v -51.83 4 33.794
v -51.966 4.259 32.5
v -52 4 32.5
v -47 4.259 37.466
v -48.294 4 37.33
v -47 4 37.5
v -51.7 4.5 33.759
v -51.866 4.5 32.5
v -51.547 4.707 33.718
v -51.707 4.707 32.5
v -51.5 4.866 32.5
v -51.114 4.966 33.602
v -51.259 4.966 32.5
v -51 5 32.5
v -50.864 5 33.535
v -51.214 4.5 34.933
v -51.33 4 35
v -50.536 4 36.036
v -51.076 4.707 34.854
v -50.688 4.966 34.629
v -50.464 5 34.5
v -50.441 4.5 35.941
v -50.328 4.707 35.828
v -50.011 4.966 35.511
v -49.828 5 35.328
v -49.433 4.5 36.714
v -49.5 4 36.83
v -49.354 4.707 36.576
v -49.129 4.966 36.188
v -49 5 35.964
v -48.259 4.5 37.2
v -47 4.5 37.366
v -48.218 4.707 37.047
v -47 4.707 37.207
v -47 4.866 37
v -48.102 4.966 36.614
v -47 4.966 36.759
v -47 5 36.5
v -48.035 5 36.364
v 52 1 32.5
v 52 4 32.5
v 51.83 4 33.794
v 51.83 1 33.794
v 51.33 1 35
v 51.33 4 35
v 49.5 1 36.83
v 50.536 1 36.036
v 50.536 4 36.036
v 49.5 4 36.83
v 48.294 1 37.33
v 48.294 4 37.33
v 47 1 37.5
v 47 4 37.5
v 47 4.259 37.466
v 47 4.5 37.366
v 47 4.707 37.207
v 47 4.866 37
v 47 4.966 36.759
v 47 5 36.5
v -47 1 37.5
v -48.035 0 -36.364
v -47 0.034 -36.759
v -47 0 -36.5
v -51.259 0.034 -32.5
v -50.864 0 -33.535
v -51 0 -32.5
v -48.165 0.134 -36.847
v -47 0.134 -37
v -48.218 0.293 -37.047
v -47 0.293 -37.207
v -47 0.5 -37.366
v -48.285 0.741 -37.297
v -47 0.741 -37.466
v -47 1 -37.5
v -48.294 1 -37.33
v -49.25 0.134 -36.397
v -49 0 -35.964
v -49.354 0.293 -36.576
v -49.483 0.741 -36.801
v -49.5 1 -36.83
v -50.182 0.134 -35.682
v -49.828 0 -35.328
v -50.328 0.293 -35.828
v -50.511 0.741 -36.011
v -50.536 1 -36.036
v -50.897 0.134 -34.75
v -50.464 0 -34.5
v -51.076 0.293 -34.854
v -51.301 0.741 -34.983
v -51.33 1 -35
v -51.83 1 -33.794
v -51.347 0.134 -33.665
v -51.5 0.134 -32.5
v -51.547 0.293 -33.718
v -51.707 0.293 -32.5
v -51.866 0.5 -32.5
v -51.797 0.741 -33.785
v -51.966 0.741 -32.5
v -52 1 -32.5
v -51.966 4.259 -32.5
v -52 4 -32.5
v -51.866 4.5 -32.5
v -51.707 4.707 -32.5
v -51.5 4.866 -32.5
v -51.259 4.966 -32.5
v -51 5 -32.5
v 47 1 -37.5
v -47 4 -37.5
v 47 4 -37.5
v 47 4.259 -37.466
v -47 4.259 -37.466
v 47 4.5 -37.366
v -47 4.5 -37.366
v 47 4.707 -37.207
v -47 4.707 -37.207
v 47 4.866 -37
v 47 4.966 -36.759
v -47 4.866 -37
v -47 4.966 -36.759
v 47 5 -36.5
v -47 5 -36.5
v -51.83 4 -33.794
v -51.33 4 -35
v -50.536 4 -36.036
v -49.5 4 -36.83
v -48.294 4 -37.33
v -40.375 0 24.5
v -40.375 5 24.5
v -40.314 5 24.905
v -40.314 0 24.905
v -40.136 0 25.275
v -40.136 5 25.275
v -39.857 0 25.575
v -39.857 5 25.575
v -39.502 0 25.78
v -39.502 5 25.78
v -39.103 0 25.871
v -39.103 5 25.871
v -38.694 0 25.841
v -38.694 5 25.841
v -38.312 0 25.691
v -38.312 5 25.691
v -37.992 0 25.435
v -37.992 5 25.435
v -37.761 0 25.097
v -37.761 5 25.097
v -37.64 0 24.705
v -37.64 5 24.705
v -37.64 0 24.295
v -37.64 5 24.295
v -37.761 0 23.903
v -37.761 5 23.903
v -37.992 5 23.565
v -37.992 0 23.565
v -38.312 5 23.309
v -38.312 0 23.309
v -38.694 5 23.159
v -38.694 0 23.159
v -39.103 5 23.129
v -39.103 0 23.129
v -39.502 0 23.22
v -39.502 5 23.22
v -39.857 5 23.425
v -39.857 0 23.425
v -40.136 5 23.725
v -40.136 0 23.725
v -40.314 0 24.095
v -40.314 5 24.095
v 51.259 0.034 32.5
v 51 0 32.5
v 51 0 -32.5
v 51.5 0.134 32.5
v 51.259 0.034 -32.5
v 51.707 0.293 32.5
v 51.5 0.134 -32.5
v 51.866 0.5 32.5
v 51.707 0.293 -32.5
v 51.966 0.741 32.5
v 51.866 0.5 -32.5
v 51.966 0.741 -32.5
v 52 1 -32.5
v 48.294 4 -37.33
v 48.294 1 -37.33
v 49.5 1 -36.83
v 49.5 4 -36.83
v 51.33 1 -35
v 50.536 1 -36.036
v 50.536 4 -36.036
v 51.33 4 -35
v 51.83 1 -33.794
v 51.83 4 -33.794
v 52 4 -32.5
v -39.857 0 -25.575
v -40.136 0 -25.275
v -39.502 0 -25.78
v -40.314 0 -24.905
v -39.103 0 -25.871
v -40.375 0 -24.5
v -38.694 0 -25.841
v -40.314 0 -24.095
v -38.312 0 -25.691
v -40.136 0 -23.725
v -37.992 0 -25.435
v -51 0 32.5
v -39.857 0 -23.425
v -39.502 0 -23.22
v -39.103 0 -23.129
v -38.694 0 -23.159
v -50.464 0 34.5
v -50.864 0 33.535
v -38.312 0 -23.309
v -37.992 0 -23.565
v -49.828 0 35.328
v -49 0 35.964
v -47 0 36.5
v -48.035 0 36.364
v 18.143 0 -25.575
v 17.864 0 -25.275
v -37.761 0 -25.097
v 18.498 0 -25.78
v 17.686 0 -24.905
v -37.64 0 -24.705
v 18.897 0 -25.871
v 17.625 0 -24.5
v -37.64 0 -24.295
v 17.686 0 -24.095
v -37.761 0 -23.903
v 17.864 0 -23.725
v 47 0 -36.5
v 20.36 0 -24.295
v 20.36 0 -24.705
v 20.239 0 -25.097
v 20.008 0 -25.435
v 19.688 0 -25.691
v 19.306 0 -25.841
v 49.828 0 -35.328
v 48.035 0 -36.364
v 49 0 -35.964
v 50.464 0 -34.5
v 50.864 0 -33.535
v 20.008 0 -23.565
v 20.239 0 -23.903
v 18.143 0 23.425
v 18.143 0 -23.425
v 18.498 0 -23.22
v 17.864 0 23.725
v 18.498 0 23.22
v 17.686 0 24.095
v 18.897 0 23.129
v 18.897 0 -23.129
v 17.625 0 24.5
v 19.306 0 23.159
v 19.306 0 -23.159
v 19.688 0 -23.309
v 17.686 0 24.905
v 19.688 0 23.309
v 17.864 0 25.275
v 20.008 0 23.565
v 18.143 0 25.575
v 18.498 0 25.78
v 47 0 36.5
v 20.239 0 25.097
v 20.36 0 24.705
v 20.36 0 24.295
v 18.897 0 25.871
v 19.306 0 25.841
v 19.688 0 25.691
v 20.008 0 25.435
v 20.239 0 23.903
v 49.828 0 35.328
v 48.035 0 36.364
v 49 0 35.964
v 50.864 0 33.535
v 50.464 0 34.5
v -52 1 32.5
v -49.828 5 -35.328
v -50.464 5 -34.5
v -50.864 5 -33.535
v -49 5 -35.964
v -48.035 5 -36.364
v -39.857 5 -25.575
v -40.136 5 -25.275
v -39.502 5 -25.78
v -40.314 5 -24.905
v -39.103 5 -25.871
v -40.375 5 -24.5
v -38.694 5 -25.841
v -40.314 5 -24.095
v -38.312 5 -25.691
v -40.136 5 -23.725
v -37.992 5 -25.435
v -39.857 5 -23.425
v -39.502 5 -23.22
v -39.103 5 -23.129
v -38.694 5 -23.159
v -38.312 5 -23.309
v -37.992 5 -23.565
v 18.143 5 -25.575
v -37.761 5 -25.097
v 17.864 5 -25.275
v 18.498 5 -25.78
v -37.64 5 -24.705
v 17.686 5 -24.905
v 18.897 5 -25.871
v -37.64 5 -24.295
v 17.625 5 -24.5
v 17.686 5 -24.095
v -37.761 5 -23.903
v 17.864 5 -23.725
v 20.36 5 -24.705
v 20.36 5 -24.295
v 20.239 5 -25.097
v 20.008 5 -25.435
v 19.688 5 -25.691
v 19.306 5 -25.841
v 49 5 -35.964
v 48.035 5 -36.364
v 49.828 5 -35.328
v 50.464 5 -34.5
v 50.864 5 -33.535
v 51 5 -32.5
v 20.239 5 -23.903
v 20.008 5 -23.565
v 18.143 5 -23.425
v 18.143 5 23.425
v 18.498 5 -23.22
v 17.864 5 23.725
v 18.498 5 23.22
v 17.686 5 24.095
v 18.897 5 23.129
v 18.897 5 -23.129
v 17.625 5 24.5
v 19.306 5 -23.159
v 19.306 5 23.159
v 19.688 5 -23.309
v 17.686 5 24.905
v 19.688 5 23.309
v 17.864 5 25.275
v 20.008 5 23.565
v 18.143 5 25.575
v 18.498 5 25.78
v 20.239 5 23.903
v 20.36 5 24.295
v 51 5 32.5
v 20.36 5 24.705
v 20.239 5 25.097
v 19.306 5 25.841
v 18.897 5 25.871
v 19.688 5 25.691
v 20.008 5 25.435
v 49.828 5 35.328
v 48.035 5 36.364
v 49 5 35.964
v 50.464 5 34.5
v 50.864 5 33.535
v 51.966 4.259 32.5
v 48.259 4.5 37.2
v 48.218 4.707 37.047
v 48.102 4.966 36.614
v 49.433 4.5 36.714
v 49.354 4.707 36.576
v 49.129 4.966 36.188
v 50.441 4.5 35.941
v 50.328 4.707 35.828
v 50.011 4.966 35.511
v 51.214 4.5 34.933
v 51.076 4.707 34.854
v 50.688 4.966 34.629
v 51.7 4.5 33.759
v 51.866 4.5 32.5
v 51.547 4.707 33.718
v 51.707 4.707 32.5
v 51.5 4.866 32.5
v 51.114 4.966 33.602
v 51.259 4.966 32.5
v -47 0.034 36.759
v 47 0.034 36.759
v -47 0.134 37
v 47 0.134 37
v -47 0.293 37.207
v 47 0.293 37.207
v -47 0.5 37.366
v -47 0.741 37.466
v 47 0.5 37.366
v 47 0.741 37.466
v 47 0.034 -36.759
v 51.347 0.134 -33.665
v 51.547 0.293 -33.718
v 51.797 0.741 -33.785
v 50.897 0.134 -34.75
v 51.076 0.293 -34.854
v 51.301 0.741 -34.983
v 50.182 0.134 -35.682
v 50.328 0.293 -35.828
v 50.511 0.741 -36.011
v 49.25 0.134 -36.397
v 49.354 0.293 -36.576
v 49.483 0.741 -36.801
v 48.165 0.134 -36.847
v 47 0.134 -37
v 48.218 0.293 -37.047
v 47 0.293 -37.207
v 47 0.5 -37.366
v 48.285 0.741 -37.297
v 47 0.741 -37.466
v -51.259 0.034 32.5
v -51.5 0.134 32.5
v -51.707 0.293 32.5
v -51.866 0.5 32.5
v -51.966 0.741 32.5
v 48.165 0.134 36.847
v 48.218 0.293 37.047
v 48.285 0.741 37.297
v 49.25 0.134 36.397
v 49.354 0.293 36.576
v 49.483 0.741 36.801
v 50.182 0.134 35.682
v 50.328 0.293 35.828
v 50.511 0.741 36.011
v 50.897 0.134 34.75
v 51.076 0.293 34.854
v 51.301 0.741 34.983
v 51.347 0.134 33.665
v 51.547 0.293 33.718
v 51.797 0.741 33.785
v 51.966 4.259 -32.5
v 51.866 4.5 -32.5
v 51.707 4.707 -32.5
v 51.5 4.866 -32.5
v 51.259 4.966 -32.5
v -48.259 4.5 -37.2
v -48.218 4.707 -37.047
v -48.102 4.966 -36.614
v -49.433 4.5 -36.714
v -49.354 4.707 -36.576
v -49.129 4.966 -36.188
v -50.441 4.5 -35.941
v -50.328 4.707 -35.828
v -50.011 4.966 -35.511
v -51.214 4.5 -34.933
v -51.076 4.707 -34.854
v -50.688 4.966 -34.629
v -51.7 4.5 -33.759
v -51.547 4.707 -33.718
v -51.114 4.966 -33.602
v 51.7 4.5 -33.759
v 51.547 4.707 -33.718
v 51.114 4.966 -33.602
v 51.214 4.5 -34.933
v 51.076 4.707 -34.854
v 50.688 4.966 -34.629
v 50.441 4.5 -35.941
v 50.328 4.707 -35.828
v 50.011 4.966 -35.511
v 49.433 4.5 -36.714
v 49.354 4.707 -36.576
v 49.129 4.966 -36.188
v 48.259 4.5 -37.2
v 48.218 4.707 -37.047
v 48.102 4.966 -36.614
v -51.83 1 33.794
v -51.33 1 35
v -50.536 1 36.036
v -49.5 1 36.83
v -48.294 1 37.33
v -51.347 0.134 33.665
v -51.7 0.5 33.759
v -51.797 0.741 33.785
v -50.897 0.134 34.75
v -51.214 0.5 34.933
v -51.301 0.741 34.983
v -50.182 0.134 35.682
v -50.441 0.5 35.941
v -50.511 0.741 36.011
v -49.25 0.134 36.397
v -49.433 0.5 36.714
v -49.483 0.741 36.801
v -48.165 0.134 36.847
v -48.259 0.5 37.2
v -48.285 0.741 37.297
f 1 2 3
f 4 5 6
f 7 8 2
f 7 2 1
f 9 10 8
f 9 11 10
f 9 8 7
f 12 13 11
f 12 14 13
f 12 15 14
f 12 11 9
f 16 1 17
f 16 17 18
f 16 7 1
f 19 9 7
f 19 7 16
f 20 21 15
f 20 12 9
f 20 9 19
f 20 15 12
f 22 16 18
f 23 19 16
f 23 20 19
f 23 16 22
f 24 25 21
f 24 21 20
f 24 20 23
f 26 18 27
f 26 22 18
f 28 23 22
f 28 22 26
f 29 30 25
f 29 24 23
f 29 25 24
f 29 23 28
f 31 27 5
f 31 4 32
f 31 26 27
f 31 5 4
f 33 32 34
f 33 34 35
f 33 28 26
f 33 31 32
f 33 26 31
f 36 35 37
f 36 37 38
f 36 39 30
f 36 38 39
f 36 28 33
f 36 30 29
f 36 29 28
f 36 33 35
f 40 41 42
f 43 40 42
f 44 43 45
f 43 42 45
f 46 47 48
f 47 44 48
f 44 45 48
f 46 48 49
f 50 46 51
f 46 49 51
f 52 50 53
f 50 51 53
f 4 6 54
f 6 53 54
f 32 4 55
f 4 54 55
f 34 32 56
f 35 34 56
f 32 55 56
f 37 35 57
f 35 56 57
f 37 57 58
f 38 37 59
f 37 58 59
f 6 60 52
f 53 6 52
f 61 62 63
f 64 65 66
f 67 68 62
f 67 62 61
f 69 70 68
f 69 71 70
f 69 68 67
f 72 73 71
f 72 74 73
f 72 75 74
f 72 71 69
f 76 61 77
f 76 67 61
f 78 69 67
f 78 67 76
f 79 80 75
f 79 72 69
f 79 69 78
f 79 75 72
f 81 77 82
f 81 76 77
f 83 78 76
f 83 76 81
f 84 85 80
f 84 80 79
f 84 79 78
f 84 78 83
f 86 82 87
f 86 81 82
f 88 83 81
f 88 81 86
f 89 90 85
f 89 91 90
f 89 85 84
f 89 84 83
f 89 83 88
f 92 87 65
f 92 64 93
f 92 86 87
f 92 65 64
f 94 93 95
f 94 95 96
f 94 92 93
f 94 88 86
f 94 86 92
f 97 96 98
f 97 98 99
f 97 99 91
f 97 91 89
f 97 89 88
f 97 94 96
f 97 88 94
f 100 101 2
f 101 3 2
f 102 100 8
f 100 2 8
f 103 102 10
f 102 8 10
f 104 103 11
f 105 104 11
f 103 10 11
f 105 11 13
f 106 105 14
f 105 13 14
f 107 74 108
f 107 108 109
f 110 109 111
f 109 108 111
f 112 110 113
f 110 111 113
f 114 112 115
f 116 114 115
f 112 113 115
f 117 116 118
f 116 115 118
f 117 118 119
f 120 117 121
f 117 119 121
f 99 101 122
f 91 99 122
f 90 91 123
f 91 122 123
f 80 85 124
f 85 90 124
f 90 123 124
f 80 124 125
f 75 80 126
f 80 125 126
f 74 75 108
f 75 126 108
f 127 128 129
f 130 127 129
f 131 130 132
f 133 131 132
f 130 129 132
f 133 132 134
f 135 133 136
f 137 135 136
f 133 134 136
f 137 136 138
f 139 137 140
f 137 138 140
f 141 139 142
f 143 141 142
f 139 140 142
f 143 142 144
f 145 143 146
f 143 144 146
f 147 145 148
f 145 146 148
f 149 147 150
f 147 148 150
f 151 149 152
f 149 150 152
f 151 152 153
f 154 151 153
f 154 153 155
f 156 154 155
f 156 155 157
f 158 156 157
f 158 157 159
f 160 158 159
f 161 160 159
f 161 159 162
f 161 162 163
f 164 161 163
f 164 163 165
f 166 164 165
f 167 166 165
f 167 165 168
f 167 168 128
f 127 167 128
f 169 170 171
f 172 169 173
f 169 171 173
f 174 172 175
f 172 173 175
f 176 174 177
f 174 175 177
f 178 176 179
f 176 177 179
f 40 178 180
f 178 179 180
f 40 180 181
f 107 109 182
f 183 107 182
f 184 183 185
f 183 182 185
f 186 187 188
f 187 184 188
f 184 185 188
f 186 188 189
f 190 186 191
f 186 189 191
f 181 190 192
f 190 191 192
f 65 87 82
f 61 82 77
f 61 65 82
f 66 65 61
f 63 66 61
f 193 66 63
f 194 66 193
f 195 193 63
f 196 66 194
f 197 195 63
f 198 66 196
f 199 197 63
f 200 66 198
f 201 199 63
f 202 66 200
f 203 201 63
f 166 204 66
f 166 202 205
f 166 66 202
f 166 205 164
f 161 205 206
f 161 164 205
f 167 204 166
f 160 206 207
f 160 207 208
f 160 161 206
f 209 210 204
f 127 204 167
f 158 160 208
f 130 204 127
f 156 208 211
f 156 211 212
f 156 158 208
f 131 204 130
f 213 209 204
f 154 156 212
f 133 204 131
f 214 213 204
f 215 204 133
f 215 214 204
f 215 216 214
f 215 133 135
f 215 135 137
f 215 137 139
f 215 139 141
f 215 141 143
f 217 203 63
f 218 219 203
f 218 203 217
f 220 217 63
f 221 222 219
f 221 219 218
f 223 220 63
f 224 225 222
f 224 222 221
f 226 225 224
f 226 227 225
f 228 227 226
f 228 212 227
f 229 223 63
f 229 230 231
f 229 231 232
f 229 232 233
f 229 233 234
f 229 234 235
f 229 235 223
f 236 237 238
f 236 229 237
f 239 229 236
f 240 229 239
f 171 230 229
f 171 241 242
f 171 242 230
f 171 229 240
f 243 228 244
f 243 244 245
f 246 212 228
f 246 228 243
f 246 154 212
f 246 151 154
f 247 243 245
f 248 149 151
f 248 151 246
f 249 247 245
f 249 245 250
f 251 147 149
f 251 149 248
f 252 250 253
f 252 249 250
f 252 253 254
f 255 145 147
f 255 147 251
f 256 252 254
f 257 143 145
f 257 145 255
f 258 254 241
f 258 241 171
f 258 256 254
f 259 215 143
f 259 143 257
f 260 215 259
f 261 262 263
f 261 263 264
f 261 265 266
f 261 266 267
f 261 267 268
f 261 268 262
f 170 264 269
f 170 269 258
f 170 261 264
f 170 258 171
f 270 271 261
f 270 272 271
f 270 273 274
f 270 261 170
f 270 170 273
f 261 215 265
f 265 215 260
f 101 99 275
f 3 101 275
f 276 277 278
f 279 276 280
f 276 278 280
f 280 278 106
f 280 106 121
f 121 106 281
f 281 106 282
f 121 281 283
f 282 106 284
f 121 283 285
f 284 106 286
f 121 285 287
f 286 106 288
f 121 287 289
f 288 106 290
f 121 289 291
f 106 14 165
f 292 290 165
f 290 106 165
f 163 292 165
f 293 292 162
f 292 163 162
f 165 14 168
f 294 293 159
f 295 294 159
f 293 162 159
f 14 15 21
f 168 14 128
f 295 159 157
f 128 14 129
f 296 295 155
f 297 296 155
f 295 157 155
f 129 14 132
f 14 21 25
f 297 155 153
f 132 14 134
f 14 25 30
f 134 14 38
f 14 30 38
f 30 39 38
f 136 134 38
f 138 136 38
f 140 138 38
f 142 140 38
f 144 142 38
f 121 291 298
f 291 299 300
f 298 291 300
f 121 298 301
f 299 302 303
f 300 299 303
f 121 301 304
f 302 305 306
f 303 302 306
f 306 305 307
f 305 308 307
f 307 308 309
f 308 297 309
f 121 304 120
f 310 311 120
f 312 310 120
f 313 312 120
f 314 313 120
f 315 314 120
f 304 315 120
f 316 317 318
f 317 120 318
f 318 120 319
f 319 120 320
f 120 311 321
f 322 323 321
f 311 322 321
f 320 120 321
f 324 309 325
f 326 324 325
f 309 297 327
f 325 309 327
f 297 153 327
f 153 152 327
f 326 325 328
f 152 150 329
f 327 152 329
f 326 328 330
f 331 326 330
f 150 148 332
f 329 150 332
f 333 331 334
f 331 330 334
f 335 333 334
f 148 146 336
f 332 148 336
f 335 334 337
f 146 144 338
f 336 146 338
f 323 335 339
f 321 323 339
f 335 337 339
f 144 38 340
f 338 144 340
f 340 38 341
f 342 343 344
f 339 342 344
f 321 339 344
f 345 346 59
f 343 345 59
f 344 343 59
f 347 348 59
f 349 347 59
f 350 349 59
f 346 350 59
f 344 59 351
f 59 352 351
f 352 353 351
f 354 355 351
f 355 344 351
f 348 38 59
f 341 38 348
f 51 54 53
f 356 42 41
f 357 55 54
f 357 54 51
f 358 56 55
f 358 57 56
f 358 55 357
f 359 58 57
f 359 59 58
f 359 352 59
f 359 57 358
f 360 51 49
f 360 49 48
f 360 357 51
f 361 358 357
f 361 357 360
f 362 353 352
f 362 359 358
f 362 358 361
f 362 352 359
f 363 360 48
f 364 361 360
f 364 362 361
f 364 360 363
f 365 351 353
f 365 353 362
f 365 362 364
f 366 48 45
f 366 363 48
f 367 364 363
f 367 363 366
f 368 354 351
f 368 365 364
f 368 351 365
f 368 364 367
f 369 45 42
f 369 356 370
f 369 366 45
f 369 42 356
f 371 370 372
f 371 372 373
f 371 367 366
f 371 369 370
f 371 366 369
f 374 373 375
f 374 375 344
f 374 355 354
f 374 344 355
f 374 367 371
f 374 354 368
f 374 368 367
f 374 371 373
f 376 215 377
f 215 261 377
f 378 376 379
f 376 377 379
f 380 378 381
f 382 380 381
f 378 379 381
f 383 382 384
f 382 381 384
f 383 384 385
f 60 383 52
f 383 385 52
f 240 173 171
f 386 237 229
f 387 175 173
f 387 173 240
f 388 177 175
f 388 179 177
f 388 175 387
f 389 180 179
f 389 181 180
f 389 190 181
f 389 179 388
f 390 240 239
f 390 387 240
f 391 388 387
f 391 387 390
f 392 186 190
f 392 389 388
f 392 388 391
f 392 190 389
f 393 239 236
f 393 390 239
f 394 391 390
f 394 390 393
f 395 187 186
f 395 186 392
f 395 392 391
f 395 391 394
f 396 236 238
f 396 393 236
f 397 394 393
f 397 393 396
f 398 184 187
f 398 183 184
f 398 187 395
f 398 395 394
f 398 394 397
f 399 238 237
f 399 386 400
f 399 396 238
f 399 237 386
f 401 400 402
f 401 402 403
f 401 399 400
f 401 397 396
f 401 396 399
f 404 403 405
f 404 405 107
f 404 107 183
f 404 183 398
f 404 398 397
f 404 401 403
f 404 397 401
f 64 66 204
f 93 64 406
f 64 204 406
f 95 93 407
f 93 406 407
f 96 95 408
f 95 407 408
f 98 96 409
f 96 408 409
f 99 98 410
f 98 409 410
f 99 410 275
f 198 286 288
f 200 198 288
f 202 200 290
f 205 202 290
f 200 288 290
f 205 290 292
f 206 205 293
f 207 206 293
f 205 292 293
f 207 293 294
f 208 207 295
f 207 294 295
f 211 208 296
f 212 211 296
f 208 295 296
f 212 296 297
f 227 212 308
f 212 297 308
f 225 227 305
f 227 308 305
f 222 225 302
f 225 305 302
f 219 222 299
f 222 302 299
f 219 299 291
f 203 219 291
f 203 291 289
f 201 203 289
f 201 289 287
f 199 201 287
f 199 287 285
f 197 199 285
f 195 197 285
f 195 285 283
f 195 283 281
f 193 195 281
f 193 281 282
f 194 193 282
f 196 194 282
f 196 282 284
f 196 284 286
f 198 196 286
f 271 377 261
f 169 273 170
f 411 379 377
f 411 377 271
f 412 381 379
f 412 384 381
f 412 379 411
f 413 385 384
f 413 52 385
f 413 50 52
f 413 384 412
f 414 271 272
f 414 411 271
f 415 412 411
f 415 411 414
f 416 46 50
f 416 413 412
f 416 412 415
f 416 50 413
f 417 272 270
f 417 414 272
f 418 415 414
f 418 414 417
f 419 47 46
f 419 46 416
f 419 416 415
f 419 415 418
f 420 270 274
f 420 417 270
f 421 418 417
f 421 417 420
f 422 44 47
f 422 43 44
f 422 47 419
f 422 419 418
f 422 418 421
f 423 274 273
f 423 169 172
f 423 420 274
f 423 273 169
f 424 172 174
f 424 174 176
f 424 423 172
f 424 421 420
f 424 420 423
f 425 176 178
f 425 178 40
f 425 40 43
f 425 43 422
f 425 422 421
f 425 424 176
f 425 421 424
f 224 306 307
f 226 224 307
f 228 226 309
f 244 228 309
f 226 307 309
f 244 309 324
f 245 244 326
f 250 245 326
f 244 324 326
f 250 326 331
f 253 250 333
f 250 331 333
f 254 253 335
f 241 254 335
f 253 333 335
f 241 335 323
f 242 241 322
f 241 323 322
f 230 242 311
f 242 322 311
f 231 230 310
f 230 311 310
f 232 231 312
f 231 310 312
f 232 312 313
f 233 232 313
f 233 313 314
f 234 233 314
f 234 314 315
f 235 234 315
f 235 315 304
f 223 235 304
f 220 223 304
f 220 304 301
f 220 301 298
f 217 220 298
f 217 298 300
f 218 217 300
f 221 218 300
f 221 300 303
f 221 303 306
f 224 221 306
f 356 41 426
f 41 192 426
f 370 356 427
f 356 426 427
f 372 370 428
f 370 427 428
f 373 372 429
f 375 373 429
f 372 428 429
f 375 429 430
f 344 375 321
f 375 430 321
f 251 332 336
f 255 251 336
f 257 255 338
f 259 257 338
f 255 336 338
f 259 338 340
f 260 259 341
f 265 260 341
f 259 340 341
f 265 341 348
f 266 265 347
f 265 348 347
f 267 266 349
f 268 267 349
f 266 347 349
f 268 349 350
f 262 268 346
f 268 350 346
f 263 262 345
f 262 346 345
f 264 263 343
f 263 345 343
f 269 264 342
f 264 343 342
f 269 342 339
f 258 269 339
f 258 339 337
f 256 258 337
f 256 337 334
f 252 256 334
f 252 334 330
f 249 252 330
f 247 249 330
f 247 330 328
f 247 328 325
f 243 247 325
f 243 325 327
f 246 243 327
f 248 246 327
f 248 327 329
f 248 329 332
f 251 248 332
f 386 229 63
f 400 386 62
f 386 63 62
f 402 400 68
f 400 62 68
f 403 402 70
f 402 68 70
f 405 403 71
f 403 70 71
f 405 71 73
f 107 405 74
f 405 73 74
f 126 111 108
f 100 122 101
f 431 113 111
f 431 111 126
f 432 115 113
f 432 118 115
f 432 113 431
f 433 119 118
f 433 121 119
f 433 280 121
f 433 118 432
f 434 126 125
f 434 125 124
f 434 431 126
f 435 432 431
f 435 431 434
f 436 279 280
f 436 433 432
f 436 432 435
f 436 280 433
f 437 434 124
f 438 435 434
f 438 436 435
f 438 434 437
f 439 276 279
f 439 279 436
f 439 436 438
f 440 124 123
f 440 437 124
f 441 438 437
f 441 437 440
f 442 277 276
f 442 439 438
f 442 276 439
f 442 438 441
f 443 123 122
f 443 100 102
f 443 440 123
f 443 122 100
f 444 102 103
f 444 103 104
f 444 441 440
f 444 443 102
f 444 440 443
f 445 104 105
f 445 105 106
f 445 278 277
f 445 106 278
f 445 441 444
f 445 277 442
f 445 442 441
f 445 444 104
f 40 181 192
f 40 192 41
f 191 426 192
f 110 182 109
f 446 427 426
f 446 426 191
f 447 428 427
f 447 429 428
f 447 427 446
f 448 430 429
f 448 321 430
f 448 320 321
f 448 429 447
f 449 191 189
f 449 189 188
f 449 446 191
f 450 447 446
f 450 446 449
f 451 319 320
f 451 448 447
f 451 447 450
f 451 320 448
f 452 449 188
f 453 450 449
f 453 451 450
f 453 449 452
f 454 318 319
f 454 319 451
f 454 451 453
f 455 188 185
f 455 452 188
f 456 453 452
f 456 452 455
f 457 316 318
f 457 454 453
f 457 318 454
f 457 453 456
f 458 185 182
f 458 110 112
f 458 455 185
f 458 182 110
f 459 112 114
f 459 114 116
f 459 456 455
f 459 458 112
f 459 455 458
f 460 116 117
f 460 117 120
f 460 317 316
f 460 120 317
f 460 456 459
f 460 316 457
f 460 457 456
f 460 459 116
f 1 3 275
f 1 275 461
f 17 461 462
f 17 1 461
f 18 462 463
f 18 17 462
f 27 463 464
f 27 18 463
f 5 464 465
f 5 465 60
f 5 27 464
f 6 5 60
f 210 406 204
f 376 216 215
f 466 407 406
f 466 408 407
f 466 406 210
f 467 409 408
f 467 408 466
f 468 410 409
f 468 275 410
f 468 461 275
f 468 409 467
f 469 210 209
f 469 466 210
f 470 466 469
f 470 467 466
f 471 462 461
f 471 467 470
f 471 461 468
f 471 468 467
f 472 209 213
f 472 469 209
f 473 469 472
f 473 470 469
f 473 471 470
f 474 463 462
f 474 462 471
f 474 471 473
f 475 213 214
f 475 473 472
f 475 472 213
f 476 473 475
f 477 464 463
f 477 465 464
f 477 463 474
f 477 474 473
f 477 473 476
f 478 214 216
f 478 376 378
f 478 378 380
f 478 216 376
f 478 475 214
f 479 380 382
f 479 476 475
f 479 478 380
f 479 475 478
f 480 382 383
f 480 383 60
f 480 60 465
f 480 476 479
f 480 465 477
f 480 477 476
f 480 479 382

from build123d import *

# Parameters (mm, degrees)
F0_W     = 104
F0_H     = 75
F1_DEPTH = 5
F2_R     = 5
F4_D     = 2.75
F5_R     = 1
F6_R     = 1


with BuildPart() as f1:
    # F0 (on Front) → F1 (new body)
    with BuildSketch(Plane.XZ):
        Rectangle(F0_W, F0_H)
    extrude(amount=-F1_DEPTH)

    # F2
    f2_edges = [f1.edges().sort_by_distance(p)[0] for p in [
        (-52, 2.5, 37.5),
        (52, 2.5, 37.5),
        (52, 2.5, -37.5),
        (-52, 2.5, -37.5),
    ]]
    fillet(f2_edges, radius=F2_R)

    # F4 (through all)
    with Locations(Plane.XZ):
        with Locations((-39, 24.5), (19, 24.5), (19, -24.5), (-39, -24.5)):
            Hole(F4_D / 2)

    # F5
    f5_edges = [f1.edges().sort_by_distance(p)[0] for p in [
        (-52, 5, 0),
    ]]
    fillet(f5_edges, radius=F5_R)

    # F6
    f6_edges = [f1.edges().sort_by_distance(p)[0] for p in [
        (0, 0, 37.5),
    ]]
    fillet(f6_edges, radius=F6_R)


solid = f1.part
